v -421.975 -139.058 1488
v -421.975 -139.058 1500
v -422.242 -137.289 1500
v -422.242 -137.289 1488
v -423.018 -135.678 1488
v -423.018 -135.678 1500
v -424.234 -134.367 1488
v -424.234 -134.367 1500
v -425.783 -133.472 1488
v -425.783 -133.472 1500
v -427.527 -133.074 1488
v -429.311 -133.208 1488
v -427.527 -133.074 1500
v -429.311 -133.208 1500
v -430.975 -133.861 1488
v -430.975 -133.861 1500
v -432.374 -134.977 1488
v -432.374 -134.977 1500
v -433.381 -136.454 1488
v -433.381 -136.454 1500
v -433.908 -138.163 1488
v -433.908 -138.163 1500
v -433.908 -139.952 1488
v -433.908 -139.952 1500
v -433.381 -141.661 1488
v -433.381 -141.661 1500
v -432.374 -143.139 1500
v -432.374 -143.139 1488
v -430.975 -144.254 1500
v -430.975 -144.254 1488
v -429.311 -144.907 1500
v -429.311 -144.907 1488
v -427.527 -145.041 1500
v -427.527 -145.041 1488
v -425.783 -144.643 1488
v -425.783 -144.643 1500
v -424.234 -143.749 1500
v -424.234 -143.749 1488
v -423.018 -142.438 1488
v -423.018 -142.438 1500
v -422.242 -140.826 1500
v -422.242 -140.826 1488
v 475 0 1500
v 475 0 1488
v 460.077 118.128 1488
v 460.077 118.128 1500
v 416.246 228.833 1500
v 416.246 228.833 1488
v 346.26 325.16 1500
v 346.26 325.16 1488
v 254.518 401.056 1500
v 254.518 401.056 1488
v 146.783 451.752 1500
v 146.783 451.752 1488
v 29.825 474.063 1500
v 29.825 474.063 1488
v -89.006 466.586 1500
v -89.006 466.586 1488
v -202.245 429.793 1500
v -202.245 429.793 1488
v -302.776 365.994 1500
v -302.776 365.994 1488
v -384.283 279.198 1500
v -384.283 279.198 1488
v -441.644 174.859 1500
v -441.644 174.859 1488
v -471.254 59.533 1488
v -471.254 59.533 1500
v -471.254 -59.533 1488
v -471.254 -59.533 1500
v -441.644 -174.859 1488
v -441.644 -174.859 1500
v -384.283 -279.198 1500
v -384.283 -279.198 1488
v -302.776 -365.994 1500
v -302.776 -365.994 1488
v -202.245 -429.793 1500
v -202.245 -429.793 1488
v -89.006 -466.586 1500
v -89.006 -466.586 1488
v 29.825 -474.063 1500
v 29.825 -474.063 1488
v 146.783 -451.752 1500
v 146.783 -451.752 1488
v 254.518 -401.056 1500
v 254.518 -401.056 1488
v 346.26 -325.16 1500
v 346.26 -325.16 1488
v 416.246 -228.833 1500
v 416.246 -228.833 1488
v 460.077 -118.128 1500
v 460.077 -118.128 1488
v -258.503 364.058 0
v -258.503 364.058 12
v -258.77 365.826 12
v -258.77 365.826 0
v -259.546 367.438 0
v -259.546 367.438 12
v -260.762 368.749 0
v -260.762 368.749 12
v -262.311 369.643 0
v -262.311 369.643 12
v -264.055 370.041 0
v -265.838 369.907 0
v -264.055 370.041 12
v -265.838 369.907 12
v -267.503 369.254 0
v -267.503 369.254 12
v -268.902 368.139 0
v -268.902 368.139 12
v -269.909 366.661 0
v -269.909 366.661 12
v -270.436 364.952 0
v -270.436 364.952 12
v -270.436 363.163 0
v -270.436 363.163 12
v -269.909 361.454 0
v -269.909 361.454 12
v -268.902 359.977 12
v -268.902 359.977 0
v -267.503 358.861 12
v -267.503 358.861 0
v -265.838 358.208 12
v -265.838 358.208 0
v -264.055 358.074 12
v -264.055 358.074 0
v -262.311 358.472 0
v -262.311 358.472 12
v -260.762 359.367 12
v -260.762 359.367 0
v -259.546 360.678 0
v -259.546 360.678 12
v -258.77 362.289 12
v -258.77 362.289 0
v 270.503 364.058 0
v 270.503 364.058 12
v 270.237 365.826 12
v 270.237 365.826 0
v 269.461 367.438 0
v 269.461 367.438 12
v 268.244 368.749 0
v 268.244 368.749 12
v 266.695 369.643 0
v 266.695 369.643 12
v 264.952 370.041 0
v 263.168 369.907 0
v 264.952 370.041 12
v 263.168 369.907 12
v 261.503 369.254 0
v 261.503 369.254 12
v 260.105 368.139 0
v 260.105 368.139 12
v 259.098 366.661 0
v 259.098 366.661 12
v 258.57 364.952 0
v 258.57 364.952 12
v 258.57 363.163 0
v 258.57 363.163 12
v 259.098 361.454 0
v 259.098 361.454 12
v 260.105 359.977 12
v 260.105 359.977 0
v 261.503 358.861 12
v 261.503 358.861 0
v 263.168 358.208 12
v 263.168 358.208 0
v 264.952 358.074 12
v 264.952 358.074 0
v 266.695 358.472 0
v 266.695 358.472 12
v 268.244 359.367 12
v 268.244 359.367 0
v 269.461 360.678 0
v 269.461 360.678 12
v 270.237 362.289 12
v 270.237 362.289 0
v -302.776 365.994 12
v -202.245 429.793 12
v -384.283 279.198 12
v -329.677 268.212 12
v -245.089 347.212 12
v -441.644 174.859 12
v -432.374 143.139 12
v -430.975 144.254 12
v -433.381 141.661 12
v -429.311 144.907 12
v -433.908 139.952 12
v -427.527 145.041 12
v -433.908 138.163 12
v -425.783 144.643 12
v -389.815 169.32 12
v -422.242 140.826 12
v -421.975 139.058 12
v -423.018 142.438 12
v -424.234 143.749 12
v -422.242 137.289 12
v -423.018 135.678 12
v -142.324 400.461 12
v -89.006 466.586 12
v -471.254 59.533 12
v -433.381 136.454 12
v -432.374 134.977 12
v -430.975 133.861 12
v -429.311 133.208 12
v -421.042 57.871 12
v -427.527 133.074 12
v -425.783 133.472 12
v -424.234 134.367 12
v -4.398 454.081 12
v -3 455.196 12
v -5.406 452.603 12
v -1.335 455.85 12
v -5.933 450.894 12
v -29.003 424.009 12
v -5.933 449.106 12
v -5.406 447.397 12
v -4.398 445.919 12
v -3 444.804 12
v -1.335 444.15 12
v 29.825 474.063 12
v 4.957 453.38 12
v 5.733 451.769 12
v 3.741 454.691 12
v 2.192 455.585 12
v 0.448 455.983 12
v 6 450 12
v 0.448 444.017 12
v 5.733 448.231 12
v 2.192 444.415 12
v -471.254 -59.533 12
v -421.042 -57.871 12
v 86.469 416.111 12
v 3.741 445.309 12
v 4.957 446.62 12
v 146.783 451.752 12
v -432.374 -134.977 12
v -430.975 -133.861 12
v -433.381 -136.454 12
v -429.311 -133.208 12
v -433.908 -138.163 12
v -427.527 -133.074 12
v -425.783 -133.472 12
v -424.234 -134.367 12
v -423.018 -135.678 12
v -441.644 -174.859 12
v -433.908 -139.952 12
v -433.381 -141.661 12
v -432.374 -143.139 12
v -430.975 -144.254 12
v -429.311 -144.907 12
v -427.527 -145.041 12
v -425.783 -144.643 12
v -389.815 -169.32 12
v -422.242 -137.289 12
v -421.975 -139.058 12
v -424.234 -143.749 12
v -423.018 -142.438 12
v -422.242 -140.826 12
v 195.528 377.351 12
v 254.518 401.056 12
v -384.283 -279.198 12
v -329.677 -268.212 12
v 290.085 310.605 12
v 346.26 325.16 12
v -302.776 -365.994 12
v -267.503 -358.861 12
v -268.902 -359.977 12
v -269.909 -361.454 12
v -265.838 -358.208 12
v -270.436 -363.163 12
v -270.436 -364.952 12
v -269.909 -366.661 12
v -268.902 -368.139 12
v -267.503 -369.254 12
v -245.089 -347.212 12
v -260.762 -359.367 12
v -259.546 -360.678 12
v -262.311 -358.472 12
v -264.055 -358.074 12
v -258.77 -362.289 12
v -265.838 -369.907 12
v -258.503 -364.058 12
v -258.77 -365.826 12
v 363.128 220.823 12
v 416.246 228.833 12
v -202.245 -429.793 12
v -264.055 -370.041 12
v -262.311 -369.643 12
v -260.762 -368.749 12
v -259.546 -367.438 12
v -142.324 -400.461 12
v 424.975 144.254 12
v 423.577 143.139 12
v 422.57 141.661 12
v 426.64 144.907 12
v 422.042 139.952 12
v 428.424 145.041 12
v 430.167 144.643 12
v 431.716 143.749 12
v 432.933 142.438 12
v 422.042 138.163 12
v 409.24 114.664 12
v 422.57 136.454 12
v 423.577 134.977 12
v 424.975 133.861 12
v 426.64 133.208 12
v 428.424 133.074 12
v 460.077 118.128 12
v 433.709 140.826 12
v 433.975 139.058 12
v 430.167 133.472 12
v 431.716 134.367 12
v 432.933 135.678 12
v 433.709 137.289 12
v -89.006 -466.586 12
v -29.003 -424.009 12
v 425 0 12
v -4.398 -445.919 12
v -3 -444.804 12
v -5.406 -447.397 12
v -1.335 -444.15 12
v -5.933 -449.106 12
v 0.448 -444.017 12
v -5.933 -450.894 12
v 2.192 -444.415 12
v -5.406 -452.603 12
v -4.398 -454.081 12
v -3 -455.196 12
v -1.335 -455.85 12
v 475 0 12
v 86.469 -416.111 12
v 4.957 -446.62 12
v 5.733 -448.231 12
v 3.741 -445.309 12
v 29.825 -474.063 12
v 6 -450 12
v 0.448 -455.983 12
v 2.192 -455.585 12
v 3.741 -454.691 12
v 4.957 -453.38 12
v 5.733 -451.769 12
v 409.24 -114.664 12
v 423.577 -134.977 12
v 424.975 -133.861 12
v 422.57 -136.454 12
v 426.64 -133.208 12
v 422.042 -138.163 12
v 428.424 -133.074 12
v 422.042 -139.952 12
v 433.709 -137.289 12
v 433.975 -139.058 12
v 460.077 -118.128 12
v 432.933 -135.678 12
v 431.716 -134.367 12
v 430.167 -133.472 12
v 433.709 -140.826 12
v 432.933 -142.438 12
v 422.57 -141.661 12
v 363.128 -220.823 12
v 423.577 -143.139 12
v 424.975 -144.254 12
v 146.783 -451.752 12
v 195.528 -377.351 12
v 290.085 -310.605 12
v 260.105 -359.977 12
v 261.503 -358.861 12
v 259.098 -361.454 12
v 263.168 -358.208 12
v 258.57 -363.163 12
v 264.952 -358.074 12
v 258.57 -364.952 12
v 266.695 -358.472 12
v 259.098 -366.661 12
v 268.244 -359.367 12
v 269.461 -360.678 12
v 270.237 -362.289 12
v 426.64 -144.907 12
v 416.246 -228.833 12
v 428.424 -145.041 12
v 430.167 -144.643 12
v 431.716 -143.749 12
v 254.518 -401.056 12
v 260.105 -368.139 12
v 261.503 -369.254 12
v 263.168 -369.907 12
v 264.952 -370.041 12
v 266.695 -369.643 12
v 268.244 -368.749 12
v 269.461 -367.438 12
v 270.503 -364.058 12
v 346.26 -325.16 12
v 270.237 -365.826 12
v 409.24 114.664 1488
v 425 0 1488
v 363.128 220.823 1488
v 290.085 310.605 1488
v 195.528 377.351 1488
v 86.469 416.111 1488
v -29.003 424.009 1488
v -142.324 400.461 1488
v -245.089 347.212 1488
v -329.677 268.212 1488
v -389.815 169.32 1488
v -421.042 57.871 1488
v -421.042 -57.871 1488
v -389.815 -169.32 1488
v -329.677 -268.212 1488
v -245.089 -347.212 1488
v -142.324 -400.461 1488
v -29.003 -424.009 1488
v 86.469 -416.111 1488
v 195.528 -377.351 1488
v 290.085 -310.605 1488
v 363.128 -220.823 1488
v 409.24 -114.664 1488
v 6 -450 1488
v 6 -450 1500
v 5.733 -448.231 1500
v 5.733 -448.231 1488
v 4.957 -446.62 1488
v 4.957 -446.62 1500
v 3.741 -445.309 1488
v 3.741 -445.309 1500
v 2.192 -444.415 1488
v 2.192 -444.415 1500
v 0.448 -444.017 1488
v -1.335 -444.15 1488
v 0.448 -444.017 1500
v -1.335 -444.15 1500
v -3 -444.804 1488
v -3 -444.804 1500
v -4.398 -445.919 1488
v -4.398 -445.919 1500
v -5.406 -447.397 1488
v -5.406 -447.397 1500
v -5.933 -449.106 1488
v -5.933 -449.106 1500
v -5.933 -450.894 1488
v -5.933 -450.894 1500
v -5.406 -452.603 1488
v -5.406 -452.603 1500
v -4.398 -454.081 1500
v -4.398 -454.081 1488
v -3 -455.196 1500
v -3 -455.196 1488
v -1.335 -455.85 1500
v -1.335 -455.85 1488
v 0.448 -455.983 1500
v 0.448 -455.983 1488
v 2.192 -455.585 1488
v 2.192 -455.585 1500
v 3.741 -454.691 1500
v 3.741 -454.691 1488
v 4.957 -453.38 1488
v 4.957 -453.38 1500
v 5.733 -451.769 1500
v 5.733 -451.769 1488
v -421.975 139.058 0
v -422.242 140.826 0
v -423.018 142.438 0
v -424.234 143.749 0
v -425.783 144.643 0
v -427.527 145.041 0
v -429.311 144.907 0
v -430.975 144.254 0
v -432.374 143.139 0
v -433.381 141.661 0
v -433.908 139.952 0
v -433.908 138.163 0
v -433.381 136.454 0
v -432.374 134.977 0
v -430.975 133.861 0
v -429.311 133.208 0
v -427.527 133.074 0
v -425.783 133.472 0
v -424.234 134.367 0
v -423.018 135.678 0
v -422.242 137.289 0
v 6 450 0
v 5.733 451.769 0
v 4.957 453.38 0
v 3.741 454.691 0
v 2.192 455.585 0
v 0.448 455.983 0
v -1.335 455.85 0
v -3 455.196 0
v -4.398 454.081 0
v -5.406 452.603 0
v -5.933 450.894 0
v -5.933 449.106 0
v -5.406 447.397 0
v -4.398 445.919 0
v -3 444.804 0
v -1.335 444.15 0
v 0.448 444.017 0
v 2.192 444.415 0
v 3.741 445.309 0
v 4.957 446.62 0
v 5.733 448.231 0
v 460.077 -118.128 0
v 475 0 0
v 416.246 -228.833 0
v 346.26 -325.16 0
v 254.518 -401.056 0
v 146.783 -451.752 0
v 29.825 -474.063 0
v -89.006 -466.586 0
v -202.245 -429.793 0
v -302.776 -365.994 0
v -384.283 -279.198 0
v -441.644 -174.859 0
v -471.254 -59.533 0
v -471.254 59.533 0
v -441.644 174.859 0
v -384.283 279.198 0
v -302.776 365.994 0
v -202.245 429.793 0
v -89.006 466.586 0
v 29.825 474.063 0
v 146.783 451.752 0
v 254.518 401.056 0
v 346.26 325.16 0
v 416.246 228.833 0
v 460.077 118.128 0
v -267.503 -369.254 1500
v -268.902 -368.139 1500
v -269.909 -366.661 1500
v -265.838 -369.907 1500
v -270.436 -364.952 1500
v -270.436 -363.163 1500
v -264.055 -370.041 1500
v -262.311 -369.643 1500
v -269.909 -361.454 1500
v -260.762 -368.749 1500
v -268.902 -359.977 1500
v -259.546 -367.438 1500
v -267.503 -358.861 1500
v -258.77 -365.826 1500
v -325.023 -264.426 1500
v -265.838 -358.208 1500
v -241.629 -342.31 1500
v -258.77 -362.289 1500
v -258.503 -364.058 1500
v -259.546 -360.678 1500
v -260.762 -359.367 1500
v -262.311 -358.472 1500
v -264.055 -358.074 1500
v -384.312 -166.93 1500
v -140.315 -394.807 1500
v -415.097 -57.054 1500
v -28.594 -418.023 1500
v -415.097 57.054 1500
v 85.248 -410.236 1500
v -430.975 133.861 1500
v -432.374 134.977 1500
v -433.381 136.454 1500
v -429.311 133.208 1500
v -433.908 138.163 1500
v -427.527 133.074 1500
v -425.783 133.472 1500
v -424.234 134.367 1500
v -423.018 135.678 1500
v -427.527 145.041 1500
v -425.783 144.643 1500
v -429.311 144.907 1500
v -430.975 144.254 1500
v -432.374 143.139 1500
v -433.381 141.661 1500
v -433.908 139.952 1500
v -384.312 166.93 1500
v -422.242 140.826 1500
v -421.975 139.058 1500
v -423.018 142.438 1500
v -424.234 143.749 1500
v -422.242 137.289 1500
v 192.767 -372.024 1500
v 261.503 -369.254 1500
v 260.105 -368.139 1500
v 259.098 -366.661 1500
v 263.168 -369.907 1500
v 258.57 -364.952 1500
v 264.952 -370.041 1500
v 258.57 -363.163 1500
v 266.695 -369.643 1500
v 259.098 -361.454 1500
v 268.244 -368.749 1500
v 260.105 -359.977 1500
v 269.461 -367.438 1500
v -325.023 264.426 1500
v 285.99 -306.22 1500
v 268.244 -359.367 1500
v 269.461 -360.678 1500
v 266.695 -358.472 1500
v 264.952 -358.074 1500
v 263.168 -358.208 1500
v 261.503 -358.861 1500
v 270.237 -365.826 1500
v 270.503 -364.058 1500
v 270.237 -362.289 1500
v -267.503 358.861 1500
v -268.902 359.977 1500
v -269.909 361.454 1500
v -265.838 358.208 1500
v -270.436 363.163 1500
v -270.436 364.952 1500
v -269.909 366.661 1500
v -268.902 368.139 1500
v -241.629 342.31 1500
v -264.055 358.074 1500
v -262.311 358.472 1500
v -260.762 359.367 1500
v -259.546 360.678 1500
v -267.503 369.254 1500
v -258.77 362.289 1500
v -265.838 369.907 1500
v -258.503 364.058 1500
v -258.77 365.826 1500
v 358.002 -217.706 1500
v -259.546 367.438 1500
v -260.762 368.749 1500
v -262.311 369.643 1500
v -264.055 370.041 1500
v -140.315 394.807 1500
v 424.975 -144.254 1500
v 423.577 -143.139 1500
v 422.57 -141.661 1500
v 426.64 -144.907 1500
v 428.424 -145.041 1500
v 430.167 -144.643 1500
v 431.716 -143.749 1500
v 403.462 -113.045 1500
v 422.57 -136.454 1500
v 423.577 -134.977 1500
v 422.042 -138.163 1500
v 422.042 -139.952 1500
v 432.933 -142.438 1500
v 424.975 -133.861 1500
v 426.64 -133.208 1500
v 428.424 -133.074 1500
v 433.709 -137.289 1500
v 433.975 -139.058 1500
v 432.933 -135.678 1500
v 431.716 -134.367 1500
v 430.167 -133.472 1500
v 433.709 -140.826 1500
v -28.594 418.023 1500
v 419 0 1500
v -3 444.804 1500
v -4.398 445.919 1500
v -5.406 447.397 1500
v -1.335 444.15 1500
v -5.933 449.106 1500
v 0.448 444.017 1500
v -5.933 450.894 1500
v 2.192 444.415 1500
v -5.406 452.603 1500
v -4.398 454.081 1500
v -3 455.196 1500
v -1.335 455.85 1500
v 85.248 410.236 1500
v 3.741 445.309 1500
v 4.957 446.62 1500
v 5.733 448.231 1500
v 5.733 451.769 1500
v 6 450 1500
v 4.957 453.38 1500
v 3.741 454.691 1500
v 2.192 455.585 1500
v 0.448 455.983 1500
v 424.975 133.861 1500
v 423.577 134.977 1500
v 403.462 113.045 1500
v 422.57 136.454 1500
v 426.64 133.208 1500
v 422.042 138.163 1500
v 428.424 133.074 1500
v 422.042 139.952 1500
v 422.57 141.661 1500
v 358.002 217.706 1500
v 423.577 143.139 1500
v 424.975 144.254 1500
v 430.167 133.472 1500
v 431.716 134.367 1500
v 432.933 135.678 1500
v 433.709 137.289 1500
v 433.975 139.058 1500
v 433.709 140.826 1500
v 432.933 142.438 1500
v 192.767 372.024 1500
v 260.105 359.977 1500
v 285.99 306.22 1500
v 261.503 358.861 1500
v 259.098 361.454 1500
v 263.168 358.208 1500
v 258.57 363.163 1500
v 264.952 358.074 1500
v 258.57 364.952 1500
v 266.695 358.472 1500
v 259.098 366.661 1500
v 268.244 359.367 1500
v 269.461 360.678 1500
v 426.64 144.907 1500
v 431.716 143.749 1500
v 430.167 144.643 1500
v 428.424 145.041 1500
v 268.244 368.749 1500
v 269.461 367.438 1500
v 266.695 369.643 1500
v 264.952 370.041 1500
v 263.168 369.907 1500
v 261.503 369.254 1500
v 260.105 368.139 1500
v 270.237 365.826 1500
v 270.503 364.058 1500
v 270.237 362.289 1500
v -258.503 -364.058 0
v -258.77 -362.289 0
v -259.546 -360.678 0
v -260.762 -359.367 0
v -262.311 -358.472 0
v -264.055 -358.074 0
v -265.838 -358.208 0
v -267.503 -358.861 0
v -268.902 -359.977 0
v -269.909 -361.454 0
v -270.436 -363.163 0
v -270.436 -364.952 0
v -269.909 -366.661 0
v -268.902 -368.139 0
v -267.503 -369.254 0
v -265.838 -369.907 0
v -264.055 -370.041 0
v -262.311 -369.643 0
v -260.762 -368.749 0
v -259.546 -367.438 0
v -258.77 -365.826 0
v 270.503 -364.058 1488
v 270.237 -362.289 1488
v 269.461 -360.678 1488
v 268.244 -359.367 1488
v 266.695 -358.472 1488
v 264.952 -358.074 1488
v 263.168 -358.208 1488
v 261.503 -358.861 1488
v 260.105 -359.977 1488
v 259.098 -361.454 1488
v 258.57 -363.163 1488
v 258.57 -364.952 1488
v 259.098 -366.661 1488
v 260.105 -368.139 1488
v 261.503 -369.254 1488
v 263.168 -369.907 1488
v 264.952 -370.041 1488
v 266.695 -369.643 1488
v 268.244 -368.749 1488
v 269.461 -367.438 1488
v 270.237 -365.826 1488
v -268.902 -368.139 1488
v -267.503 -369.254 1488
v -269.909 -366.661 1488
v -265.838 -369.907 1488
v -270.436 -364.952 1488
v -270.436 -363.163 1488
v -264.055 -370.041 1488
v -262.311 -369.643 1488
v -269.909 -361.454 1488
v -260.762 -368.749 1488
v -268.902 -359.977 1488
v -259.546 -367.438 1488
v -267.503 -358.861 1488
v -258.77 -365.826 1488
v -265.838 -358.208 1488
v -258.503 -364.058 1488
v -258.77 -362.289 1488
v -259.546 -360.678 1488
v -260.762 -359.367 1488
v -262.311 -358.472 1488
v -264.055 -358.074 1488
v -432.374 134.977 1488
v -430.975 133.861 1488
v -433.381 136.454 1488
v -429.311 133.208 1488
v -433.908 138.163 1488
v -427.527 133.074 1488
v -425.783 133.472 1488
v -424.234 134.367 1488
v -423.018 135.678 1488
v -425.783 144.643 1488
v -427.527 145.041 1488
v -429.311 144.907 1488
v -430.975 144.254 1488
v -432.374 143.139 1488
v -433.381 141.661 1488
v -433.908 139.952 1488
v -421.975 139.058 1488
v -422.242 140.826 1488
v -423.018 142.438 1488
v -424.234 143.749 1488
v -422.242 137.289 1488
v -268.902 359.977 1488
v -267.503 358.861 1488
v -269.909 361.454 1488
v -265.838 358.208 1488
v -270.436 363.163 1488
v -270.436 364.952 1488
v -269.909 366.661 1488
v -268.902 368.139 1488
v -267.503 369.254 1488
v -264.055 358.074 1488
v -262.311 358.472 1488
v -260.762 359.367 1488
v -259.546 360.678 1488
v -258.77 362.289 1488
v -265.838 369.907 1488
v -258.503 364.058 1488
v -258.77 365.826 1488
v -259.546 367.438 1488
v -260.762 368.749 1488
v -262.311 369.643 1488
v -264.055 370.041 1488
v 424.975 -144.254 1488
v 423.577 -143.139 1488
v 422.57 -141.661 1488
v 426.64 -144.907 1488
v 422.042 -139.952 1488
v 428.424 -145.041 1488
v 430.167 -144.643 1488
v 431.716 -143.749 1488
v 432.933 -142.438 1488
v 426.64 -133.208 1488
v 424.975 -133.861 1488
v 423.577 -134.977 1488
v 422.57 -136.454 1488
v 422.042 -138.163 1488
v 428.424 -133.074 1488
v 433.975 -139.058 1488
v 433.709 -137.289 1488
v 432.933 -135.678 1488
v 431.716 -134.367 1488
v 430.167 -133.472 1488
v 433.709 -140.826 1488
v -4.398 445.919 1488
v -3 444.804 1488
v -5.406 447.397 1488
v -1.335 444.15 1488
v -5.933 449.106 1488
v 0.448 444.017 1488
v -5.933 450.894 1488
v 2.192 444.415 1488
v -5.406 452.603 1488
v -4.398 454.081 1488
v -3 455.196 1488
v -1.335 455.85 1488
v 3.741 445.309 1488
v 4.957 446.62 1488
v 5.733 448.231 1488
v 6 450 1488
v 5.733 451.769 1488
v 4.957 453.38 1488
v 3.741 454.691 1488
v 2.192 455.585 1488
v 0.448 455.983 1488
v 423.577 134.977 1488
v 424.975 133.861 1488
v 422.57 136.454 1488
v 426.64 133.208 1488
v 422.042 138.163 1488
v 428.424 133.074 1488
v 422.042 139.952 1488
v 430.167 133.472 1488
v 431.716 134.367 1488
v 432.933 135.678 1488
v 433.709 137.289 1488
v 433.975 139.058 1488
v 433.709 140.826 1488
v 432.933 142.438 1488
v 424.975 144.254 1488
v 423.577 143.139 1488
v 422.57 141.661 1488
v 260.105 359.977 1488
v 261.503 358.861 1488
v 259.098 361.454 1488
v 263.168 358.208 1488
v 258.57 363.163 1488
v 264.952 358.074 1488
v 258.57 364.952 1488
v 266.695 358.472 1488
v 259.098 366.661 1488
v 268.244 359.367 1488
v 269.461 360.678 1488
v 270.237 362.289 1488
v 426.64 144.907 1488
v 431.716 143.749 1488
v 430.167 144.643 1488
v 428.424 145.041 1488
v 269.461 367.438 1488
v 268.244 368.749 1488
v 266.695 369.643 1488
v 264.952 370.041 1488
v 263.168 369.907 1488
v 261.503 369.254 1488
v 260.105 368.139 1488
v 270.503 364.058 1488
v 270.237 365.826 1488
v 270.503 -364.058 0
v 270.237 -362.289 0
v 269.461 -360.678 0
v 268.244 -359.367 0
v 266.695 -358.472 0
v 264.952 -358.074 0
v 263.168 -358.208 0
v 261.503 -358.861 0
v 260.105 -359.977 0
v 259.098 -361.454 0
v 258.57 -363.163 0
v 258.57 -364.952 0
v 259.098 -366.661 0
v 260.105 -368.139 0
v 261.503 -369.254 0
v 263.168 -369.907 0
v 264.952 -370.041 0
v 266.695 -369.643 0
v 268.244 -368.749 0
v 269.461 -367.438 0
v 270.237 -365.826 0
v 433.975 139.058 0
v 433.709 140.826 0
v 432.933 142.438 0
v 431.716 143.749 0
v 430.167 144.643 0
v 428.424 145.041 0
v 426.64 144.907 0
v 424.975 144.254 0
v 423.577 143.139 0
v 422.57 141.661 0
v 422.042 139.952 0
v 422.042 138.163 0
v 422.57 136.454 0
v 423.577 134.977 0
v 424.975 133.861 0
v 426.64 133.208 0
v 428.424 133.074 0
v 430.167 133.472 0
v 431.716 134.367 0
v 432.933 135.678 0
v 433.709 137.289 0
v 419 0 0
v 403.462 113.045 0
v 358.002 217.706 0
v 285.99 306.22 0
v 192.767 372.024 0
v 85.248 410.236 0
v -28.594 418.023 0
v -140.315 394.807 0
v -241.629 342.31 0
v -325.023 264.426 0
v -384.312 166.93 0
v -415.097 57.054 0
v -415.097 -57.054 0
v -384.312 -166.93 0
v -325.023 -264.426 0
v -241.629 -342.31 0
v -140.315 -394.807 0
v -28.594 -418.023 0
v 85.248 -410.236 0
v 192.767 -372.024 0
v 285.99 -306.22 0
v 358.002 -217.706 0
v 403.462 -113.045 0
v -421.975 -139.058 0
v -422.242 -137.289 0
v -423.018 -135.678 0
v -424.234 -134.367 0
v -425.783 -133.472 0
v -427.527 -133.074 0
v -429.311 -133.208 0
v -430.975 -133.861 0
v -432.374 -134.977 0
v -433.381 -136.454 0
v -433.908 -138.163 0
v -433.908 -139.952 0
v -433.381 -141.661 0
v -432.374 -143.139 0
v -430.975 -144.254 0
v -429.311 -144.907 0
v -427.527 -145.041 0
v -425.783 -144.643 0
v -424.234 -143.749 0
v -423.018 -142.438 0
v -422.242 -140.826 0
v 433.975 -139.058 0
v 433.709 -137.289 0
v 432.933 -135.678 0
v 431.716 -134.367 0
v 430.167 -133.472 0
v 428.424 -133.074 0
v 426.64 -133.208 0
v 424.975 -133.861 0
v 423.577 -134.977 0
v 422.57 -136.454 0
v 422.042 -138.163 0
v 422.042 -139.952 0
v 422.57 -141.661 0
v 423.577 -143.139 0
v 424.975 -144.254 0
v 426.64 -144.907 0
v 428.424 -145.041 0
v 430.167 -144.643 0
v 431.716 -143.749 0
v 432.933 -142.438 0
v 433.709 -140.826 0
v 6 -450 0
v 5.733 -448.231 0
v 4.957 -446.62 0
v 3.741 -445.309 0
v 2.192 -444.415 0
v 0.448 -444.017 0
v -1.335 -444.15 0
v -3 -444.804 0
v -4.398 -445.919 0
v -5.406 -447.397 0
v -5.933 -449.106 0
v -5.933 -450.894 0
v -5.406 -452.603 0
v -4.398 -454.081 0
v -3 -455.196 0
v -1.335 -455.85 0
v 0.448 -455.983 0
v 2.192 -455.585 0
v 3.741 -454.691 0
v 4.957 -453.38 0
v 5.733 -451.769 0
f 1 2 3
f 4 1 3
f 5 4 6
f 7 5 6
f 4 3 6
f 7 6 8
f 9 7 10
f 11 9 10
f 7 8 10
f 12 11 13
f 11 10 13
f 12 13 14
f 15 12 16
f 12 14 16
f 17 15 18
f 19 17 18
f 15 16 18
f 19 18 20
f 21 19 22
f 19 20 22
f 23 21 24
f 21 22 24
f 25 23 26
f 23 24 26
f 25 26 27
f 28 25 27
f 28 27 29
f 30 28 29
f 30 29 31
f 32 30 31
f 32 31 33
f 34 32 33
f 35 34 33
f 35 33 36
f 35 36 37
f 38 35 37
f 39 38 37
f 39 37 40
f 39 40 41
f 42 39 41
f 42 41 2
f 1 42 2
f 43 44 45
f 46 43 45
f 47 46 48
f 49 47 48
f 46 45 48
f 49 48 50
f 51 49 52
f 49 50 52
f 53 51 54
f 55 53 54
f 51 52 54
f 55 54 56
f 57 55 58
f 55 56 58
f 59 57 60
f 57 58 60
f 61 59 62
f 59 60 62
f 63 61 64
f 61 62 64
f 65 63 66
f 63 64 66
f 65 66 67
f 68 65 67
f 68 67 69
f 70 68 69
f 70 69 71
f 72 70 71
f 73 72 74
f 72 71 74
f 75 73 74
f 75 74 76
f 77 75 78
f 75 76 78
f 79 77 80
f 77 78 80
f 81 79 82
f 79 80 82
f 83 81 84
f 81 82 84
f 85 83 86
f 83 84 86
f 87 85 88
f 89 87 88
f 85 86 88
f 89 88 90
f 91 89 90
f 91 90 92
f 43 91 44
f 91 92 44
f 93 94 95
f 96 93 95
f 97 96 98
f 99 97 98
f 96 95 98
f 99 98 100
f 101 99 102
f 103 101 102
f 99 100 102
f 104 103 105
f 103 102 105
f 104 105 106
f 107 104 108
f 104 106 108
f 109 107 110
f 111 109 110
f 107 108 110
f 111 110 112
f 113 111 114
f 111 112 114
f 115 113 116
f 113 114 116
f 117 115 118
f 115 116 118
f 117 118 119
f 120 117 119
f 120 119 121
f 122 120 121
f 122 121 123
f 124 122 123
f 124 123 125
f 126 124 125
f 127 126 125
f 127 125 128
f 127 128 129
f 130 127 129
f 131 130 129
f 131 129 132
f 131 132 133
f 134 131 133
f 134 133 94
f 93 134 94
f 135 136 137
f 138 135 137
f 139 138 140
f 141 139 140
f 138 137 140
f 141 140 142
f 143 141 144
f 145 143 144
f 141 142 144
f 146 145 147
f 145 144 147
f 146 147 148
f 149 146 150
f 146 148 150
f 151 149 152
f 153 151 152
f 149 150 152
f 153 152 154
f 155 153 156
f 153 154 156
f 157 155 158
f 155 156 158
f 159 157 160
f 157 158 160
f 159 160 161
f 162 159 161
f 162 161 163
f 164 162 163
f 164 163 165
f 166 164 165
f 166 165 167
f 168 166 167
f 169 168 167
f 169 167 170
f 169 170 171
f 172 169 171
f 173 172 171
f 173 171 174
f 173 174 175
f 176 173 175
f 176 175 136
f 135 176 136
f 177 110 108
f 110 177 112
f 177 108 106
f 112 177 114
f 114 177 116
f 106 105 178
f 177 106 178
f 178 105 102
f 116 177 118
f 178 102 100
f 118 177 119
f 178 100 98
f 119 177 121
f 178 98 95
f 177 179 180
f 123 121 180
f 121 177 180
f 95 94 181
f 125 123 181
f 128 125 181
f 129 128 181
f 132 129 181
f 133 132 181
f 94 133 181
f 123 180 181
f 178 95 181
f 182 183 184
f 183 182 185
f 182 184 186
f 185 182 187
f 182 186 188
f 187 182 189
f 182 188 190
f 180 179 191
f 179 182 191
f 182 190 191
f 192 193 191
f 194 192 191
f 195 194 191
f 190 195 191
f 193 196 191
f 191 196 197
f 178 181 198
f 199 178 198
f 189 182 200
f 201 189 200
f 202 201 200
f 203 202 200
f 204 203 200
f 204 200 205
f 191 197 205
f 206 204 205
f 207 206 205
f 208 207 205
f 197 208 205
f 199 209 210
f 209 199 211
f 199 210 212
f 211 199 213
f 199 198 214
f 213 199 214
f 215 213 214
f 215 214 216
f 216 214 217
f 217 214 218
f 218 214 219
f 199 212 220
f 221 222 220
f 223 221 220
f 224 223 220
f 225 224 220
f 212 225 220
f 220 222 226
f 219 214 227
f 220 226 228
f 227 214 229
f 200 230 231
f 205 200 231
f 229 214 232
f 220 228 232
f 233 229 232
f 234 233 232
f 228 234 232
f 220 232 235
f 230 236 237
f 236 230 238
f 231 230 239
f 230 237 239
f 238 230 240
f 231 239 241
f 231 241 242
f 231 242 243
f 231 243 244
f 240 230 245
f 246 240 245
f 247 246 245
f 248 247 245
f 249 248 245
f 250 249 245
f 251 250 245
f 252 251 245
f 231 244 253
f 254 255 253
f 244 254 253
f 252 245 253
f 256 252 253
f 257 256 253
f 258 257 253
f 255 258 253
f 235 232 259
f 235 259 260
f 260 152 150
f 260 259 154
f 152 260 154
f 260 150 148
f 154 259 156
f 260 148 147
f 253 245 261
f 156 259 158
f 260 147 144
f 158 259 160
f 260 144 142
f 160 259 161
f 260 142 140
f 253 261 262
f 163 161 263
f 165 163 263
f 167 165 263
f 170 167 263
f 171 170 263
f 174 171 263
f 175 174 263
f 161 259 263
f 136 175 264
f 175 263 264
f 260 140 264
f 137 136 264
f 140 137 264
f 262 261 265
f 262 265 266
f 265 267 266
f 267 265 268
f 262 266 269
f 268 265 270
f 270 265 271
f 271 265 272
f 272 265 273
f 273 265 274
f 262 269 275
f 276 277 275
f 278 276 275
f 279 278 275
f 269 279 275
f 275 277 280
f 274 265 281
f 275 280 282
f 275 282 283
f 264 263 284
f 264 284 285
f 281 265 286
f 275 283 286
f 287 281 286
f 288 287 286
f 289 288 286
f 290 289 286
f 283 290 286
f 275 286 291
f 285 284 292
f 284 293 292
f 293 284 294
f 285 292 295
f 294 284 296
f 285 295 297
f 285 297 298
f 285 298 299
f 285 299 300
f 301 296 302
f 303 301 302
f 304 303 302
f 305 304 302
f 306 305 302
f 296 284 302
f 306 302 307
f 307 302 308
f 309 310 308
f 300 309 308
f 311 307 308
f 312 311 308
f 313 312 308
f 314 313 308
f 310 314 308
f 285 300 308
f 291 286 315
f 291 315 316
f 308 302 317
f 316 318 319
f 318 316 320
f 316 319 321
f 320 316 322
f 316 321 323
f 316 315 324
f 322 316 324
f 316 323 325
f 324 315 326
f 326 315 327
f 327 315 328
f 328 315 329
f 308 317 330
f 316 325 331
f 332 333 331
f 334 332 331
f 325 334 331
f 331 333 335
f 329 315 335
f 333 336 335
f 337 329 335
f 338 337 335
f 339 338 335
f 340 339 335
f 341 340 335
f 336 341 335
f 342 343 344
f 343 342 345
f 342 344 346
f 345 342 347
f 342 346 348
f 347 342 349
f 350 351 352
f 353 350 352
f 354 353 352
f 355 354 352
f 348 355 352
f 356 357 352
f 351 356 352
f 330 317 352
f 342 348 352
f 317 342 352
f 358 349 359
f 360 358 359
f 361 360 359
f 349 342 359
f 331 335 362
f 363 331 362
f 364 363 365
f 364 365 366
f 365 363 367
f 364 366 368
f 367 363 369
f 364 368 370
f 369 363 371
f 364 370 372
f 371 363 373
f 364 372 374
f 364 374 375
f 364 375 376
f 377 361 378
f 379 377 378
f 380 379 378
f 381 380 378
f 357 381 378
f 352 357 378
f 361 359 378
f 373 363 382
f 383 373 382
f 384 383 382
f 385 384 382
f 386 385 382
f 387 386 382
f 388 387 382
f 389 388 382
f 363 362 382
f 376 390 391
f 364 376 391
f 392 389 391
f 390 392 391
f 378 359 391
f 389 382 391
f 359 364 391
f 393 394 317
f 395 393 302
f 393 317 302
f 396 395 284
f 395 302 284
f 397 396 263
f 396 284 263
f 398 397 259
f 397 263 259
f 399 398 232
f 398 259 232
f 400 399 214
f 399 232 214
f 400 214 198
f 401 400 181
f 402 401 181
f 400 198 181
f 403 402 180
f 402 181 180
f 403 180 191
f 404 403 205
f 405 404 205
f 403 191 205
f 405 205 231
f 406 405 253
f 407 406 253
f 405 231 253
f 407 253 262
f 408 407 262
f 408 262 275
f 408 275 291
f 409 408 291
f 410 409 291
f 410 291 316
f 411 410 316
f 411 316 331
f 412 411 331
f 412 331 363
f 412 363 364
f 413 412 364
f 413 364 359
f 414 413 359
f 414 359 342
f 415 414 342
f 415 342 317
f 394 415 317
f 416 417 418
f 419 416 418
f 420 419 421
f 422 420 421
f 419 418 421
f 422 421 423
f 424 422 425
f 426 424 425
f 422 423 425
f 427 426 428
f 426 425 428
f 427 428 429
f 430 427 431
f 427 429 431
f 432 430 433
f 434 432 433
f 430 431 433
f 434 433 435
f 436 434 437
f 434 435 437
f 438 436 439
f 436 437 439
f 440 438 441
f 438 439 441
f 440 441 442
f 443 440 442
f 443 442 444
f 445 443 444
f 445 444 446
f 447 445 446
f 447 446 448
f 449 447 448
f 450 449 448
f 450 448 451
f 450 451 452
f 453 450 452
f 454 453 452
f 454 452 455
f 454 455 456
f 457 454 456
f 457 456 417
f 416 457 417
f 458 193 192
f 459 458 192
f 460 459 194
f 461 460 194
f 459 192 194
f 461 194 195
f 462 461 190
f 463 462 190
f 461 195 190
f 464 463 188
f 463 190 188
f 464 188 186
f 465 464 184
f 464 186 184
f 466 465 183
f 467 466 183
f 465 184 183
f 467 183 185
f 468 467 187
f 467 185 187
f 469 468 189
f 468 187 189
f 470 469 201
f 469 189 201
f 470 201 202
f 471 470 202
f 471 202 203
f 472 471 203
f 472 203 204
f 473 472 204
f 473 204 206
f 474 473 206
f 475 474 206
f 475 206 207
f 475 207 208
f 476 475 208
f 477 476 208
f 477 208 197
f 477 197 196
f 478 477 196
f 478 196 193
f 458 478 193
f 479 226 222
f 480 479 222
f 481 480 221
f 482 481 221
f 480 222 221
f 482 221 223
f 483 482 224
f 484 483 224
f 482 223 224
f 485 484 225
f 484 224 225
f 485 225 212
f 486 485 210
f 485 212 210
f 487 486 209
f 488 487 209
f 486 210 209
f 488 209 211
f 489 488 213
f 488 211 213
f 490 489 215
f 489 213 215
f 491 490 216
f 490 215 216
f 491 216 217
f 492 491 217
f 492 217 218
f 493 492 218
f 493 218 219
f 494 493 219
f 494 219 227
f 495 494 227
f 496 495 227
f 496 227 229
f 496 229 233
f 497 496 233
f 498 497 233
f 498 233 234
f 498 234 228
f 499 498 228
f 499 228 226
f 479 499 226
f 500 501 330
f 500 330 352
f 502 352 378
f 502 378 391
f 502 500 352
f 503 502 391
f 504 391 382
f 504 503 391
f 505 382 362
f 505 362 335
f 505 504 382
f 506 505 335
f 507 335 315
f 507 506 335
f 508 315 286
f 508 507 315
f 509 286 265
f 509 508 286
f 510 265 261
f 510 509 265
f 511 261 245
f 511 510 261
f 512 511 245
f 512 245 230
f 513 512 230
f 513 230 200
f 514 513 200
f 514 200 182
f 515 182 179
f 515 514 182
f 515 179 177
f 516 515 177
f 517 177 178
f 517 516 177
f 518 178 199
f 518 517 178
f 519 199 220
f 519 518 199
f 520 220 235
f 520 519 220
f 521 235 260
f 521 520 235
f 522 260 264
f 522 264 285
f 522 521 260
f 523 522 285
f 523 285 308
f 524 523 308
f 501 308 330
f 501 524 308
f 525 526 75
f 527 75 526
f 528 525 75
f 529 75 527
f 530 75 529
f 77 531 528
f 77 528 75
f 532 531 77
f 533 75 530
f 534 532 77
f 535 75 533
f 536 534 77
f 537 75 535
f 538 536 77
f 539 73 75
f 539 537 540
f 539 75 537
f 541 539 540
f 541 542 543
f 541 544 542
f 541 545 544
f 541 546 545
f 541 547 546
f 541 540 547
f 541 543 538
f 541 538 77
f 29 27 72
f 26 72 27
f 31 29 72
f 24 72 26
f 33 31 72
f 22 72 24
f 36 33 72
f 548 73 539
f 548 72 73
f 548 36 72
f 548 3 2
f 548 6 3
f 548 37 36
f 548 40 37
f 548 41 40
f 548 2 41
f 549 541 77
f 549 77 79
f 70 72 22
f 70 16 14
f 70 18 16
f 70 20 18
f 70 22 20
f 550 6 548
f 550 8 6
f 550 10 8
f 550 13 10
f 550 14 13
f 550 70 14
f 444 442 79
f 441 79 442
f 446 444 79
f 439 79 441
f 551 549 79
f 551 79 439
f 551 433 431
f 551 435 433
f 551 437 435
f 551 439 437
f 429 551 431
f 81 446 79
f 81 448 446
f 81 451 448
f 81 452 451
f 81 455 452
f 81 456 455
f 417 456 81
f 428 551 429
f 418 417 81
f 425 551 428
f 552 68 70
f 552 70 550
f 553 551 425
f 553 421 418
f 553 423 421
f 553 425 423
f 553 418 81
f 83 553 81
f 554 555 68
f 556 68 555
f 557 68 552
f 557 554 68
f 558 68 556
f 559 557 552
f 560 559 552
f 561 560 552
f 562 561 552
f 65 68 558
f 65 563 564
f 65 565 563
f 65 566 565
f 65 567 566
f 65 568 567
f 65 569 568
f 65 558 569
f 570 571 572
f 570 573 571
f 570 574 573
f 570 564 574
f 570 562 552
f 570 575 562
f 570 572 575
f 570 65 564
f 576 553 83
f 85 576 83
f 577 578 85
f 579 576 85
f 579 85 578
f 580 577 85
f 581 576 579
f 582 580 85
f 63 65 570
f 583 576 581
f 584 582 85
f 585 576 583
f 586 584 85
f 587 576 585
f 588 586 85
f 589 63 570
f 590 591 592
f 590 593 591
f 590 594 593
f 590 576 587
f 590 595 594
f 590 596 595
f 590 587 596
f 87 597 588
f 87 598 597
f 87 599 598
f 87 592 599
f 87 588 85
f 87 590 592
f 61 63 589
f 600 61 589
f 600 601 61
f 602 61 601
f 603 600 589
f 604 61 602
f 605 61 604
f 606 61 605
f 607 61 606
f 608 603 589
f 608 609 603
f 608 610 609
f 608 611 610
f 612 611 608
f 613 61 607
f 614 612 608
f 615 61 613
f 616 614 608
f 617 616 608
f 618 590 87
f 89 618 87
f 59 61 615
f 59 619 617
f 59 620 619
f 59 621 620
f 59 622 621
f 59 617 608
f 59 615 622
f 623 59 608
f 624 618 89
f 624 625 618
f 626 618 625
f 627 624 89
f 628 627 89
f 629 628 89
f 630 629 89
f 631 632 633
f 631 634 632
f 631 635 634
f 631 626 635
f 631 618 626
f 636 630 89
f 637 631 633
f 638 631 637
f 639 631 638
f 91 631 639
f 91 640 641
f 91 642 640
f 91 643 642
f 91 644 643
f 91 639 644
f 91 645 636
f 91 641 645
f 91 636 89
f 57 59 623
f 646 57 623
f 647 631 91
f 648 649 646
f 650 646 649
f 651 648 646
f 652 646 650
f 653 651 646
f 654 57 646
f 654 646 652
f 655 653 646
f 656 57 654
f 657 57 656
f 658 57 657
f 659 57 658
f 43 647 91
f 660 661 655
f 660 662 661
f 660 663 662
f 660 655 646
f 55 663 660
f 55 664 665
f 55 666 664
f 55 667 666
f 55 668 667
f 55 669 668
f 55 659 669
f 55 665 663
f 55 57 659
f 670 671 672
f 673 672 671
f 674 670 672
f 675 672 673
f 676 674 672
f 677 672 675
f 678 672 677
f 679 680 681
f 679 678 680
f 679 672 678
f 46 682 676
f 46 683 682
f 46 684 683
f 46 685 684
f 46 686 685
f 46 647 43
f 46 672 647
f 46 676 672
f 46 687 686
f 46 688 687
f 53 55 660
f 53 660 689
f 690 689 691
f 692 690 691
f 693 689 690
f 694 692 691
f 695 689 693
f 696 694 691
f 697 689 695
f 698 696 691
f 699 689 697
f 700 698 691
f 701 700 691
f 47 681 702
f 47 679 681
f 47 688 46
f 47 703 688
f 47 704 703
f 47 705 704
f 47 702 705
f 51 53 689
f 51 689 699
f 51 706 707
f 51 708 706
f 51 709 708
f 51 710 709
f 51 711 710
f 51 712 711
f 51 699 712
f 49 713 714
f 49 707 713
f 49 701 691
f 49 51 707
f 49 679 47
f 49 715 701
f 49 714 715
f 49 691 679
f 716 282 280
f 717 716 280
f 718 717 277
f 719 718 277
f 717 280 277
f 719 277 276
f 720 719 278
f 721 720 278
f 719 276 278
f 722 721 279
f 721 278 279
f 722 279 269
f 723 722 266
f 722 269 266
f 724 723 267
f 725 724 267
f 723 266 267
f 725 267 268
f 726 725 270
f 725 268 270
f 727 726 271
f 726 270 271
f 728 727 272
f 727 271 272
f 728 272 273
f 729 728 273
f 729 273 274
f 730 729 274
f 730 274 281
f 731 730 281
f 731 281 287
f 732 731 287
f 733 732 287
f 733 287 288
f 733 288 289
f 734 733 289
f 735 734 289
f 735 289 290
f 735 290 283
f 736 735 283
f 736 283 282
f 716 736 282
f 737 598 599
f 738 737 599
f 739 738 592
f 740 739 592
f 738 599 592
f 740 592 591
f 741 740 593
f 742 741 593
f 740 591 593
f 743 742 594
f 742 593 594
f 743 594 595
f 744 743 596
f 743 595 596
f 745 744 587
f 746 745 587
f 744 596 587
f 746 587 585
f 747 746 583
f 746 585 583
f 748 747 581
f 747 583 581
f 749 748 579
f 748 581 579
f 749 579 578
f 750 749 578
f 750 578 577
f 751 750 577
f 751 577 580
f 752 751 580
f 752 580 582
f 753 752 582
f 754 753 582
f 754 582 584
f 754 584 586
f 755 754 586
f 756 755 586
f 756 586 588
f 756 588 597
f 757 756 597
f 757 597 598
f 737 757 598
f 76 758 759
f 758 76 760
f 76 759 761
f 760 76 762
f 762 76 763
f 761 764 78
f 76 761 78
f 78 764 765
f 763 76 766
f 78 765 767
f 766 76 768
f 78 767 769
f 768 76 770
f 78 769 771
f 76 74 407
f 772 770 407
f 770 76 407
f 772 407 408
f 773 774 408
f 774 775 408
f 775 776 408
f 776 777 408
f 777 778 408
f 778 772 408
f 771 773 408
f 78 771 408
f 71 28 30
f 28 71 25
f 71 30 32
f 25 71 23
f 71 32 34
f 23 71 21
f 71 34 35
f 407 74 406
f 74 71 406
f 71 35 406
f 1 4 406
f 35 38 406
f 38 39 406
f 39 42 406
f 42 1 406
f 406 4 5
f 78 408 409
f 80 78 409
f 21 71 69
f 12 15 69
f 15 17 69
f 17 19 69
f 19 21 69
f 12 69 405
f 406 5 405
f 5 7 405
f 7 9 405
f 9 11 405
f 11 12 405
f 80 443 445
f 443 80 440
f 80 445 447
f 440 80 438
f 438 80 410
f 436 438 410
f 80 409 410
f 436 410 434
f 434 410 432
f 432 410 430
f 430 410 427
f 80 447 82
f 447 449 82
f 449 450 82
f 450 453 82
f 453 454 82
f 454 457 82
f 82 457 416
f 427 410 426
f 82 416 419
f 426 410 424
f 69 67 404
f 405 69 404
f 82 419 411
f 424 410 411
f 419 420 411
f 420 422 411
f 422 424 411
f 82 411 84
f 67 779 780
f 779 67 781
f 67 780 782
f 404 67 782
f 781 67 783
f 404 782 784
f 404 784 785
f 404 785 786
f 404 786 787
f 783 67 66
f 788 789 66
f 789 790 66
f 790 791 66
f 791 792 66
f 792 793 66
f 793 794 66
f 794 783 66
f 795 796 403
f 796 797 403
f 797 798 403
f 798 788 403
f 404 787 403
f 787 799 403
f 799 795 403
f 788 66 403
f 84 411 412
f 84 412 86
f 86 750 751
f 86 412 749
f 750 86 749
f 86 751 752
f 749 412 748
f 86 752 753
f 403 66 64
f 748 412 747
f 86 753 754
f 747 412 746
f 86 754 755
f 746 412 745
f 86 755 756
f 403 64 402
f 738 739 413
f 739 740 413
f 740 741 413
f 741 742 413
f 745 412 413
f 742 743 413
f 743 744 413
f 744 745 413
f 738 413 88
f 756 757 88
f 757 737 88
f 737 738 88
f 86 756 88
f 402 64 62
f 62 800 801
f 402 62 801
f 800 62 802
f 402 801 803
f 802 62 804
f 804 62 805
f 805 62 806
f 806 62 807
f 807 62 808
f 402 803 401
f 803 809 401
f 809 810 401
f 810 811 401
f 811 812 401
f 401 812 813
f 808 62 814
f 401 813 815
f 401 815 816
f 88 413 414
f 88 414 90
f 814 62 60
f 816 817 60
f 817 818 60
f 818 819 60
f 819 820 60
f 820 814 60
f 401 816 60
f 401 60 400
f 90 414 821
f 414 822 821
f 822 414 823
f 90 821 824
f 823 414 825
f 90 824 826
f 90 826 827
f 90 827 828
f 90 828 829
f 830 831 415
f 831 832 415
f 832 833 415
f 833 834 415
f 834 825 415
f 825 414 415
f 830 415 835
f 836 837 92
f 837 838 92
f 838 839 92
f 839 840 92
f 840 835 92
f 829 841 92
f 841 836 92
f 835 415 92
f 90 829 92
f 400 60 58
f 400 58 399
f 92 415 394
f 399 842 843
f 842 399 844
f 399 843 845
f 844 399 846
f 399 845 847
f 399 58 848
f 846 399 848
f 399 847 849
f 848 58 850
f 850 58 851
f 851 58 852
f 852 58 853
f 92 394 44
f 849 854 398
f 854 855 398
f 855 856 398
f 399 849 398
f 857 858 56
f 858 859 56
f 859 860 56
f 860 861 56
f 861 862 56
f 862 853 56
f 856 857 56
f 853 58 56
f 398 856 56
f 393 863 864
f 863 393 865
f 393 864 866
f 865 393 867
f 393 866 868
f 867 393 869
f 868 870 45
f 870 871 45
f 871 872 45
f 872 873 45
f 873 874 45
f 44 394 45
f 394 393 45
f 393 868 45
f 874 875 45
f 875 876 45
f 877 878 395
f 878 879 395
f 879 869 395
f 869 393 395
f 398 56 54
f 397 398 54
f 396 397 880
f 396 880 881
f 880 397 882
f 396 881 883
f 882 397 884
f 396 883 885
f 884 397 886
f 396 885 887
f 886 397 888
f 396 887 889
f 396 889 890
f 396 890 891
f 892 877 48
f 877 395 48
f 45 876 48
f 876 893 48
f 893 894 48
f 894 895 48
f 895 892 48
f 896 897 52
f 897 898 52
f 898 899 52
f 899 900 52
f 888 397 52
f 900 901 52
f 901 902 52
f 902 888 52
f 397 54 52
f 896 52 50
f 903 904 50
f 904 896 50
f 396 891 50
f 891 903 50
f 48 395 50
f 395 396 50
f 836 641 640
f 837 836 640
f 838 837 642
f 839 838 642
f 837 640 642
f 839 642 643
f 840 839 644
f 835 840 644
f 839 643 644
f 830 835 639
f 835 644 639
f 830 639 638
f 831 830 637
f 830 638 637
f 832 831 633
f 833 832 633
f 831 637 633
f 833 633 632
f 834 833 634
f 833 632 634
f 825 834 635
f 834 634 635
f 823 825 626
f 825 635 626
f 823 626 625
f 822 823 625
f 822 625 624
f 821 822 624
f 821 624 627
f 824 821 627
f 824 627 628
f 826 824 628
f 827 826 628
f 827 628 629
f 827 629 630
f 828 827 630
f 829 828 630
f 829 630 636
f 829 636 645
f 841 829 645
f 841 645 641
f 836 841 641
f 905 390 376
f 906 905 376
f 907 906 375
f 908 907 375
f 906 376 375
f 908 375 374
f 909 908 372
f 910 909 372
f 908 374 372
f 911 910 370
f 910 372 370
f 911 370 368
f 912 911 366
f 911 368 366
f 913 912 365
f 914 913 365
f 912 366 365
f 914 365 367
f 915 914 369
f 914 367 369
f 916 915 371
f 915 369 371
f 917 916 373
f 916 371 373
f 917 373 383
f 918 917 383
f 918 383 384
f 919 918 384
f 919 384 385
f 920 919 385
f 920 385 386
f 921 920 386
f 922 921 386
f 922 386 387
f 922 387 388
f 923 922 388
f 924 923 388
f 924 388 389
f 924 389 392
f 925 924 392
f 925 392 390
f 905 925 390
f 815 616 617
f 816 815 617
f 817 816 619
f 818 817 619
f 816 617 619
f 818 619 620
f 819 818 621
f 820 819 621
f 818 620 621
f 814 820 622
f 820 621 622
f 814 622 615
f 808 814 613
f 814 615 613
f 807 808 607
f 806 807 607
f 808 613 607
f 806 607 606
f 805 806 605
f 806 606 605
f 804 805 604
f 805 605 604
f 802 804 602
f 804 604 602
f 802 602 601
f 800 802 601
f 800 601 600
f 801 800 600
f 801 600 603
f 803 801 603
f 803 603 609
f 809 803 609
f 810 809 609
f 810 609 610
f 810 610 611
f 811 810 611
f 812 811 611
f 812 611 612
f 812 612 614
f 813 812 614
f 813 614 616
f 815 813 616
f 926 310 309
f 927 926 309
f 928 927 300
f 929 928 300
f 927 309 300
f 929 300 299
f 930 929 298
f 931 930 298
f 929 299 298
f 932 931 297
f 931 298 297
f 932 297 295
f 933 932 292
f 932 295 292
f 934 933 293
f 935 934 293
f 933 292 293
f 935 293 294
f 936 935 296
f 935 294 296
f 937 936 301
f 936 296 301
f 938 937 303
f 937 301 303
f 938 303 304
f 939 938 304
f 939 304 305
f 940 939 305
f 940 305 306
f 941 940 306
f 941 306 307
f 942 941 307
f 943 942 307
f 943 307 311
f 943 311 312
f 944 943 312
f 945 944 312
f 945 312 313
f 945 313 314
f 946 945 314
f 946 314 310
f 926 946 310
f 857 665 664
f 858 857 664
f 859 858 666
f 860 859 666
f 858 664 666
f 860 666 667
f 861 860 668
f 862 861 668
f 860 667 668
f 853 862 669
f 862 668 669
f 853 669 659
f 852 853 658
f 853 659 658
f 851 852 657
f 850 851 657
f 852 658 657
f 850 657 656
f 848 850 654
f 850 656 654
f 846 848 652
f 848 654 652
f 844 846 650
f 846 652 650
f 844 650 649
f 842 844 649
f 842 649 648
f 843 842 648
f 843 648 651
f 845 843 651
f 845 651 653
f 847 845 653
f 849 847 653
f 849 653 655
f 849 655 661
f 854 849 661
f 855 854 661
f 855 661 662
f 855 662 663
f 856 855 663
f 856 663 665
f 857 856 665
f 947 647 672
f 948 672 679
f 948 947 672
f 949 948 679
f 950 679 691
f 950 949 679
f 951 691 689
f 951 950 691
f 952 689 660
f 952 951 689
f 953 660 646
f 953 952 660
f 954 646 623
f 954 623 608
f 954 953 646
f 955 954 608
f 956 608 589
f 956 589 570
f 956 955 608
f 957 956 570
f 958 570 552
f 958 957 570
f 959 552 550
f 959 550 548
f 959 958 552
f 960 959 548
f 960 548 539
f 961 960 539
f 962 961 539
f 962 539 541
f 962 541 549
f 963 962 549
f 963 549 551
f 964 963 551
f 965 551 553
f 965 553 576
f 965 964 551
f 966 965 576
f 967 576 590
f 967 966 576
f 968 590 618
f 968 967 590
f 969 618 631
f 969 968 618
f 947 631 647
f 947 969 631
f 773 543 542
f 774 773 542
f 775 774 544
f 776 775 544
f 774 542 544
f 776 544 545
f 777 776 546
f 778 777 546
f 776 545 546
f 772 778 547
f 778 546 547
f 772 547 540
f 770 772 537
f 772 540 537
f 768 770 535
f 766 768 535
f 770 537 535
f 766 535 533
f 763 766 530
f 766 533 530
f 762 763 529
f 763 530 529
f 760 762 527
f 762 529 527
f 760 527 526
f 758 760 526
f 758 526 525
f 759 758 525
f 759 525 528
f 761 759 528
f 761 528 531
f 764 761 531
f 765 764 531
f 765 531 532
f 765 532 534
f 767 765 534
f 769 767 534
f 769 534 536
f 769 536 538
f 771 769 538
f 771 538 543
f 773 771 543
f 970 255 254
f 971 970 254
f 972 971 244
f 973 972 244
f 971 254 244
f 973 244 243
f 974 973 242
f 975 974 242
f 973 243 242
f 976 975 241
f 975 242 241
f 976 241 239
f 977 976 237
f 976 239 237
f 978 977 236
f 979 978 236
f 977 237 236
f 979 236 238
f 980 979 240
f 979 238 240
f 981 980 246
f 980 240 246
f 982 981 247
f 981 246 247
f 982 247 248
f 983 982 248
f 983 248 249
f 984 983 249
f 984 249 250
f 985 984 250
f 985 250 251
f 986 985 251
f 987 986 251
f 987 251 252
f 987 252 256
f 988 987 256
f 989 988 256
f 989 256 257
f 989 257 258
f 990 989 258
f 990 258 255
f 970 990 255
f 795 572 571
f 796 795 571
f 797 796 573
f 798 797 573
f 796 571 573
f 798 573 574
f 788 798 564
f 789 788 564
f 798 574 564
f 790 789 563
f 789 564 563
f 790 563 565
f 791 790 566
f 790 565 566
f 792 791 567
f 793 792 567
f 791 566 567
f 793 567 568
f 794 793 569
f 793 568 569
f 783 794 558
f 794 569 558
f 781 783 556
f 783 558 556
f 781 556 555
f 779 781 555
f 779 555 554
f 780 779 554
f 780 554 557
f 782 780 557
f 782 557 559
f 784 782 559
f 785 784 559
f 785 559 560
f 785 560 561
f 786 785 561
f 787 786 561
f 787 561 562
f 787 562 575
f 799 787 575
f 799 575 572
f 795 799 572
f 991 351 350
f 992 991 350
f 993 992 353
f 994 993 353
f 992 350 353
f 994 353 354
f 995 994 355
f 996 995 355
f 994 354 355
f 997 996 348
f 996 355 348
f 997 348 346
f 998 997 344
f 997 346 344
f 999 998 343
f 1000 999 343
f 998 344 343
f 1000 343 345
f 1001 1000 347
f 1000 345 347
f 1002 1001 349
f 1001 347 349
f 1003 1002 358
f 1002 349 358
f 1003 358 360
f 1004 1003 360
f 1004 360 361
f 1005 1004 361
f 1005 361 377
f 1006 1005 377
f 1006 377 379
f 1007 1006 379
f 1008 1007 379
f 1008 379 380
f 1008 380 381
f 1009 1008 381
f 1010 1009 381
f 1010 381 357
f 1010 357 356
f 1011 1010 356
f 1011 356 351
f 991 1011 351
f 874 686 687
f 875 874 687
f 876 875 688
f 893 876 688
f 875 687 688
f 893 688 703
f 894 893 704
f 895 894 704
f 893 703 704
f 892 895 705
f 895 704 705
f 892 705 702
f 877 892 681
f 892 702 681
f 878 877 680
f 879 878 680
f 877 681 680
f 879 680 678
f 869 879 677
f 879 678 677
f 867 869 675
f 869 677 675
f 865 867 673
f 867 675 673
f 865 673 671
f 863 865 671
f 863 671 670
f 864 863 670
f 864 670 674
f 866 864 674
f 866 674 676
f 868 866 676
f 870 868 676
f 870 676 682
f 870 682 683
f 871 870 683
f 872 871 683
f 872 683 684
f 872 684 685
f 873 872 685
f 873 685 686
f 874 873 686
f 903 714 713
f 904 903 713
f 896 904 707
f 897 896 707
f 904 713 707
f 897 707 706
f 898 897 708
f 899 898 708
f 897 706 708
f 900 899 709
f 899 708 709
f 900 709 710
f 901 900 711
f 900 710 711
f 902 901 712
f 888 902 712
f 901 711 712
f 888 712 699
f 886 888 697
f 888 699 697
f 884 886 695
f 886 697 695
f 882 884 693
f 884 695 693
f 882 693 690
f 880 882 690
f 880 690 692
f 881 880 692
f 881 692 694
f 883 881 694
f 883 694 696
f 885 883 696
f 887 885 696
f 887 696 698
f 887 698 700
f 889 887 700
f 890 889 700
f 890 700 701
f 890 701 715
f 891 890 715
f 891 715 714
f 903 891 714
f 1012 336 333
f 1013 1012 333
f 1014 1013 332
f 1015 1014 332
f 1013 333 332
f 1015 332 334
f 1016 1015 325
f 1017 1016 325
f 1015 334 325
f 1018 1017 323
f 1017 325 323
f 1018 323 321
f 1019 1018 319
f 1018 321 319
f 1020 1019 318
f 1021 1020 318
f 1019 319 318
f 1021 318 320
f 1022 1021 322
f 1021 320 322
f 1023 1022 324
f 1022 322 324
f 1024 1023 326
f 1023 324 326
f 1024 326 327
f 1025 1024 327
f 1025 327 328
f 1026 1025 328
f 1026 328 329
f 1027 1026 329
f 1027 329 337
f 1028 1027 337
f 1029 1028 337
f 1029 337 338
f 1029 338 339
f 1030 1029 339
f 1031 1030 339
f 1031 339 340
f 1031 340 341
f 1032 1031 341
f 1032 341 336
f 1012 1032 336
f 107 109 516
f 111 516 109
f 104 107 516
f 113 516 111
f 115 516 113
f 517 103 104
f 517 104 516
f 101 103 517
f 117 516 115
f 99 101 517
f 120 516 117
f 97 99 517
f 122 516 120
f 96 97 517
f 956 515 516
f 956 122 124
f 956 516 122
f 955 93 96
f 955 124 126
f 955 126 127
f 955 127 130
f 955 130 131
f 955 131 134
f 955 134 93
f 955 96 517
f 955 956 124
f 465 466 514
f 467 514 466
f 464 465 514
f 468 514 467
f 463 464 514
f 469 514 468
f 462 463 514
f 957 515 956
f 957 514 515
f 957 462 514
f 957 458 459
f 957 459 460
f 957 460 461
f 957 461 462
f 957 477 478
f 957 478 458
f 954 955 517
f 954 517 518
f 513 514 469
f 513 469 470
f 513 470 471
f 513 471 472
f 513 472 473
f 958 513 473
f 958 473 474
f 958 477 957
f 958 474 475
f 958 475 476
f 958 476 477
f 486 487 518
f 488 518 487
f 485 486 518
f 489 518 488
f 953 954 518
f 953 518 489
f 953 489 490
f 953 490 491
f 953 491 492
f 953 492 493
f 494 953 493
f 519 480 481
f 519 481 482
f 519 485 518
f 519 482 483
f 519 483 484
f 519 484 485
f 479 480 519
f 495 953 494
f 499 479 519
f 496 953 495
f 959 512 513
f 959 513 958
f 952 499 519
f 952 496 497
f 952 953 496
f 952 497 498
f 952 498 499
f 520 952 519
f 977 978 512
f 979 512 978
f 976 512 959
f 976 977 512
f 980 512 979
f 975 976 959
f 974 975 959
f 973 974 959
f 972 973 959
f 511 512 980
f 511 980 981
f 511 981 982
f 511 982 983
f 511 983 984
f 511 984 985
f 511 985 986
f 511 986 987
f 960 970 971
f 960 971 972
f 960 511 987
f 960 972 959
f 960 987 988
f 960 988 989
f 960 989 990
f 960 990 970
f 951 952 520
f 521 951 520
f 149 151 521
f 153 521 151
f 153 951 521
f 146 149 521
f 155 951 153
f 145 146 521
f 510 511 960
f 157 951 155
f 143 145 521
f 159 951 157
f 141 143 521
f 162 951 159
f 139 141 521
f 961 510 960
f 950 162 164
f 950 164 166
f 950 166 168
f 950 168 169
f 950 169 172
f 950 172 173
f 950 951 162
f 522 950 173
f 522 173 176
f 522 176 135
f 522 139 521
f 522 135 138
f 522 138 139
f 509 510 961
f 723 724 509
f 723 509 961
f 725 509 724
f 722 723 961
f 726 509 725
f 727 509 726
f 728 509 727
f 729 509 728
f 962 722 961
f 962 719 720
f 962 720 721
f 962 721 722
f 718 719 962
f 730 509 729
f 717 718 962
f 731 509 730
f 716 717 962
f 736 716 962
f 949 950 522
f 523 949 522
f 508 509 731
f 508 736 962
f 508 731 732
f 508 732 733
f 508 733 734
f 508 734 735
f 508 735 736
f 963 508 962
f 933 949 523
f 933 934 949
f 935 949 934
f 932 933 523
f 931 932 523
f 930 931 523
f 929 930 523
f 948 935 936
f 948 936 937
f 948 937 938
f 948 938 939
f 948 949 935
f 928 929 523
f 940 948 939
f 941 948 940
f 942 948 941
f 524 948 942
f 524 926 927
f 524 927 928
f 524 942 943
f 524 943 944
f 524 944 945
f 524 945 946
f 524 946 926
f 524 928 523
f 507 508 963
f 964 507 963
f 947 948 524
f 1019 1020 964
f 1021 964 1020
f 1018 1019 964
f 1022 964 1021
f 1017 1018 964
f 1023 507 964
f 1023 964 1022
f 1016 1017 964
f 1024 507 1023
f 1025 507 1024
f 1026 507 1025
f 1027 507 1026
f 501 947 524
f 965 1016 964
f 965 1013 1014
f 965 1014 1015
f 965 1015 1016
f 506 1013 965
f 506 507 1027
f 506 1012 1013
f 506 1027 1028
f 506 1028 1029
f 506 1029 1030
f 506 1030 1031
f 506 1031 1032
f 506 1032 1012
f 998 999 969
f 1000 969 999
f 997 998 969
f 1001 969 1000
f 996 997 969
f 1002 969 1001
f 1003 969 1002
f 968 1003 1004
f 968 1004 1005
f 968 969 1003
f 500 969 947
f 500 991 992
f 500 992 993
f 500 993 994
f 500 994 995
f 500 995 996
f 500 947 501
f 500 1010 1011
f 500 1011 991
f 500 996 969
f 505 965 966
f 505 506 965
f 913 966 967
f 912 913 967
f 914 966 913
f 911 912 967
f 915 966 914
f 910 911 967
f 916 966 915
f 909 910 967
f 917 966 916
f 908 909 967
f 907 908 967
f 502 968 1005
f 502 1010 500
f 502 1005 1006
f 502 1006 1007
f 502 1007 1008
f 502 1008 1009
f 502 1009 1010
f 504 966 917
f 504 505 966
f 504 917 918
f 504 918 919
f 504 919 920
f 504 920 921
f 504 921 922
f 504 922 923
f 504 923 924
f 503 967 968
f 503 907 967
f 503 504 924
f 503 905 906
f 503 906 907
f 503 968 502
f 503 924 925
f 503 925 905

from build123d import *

# Parameters (mm, degrees)
SKETCH1_R           = 425
SKETCH1_R_2         = 419
BOSS_EXTRUDE1_DEPTH = 1500
BOSS_EXTRUDE2_START = -12
SKETCH2_R           = 475
SKETCH2_R_2         = 425
BOSS_EXTRUDE2_DEPTH = 12
SKETCH4_R           = 475
SKETCH4_R_2         = 425
BOSS_EXTRUDE3_DEPTH = 12
SKETCH6_R           = 6
CUT_EXTRUDE3_DEPTH  = 1644.547991389


with BuildPart() as part:
    # Sketch1 → Boss-Extrude1 (new body)
    with BuildSketch(Plane.XY):
        Circle(SKETCH1_R)
        Circle(SKETCH1_R_2, mode=Mode.SUBTRACT)
    extrude(amount=BOSS_EXTRUDE1_DEPTH)

    # Sketch2 → Boss-Extrude2 (add)
    with BuildSketch(Plane.XY.offset(1500).offset(BOSS_EXTRUDE2_START)):
        Circle(SKETCH2_R)
        Circle(SKETCH2_R_2, mode=Mode.SUBTRACT)
    extrude(amount=BOSS_EXTRUDE2_DEPTH)

    # Sketch4 → Boss-Extrude3 (add)
    with BuildSketch(Plane(origin=(0, 0, 0), x_dir=(-1, 0, 0), z_dir=(0, 0, -1))):
        with Locations(Location((0, 0, 0), (0, 0, 180))):
            Circle(SKETCH4_R)
        Circle(SKETCH4_R_2, mode=Mode.SUBTRACT)
    extrude(amount=-BOSS_EXTRUDE3_DEPTH)

    # Sketch6 → Cut-Extrude3 (cut, through all)
    with BuildSketch(Plane.XY.offset(1500)):
        with Locations((0, 450)):
            Circle(SKETCH6_R)
        with Locations((264.503363532, 364.057647469)):
            Circle(SKETCH6_R)
        with Locations((427.975432333, 139.057647469)):
            Circle(SKETCH6_R)
        with Locations((427.975432333, -139.057647469)):
            Circle(SKETCH6_R)
        with Locations((264.503363532, -364.057647469)):
            Circle(SKETCH6_R)
        with Locations((0, -450)):
            Circle(SKETCH6_R)
        with Locations((-264.503363532, -364.057647469)):
            Circle(SKETCH6_R)
        with Locations((-427.975432333, -139.057647469)):
            Circle(SKETCH6_R)
        with Locations((-427.975432333, 139.057647469)):
            Circle(SKETCH6_R)
        with Locations((-264.503363532, 364.057647469)):
            Circle(SKETCH6_R)
    extrude(amount=-CUT_EXTRUDE3_DEPTH, mode=Mode.SUBTRACT)


solid = part.part
